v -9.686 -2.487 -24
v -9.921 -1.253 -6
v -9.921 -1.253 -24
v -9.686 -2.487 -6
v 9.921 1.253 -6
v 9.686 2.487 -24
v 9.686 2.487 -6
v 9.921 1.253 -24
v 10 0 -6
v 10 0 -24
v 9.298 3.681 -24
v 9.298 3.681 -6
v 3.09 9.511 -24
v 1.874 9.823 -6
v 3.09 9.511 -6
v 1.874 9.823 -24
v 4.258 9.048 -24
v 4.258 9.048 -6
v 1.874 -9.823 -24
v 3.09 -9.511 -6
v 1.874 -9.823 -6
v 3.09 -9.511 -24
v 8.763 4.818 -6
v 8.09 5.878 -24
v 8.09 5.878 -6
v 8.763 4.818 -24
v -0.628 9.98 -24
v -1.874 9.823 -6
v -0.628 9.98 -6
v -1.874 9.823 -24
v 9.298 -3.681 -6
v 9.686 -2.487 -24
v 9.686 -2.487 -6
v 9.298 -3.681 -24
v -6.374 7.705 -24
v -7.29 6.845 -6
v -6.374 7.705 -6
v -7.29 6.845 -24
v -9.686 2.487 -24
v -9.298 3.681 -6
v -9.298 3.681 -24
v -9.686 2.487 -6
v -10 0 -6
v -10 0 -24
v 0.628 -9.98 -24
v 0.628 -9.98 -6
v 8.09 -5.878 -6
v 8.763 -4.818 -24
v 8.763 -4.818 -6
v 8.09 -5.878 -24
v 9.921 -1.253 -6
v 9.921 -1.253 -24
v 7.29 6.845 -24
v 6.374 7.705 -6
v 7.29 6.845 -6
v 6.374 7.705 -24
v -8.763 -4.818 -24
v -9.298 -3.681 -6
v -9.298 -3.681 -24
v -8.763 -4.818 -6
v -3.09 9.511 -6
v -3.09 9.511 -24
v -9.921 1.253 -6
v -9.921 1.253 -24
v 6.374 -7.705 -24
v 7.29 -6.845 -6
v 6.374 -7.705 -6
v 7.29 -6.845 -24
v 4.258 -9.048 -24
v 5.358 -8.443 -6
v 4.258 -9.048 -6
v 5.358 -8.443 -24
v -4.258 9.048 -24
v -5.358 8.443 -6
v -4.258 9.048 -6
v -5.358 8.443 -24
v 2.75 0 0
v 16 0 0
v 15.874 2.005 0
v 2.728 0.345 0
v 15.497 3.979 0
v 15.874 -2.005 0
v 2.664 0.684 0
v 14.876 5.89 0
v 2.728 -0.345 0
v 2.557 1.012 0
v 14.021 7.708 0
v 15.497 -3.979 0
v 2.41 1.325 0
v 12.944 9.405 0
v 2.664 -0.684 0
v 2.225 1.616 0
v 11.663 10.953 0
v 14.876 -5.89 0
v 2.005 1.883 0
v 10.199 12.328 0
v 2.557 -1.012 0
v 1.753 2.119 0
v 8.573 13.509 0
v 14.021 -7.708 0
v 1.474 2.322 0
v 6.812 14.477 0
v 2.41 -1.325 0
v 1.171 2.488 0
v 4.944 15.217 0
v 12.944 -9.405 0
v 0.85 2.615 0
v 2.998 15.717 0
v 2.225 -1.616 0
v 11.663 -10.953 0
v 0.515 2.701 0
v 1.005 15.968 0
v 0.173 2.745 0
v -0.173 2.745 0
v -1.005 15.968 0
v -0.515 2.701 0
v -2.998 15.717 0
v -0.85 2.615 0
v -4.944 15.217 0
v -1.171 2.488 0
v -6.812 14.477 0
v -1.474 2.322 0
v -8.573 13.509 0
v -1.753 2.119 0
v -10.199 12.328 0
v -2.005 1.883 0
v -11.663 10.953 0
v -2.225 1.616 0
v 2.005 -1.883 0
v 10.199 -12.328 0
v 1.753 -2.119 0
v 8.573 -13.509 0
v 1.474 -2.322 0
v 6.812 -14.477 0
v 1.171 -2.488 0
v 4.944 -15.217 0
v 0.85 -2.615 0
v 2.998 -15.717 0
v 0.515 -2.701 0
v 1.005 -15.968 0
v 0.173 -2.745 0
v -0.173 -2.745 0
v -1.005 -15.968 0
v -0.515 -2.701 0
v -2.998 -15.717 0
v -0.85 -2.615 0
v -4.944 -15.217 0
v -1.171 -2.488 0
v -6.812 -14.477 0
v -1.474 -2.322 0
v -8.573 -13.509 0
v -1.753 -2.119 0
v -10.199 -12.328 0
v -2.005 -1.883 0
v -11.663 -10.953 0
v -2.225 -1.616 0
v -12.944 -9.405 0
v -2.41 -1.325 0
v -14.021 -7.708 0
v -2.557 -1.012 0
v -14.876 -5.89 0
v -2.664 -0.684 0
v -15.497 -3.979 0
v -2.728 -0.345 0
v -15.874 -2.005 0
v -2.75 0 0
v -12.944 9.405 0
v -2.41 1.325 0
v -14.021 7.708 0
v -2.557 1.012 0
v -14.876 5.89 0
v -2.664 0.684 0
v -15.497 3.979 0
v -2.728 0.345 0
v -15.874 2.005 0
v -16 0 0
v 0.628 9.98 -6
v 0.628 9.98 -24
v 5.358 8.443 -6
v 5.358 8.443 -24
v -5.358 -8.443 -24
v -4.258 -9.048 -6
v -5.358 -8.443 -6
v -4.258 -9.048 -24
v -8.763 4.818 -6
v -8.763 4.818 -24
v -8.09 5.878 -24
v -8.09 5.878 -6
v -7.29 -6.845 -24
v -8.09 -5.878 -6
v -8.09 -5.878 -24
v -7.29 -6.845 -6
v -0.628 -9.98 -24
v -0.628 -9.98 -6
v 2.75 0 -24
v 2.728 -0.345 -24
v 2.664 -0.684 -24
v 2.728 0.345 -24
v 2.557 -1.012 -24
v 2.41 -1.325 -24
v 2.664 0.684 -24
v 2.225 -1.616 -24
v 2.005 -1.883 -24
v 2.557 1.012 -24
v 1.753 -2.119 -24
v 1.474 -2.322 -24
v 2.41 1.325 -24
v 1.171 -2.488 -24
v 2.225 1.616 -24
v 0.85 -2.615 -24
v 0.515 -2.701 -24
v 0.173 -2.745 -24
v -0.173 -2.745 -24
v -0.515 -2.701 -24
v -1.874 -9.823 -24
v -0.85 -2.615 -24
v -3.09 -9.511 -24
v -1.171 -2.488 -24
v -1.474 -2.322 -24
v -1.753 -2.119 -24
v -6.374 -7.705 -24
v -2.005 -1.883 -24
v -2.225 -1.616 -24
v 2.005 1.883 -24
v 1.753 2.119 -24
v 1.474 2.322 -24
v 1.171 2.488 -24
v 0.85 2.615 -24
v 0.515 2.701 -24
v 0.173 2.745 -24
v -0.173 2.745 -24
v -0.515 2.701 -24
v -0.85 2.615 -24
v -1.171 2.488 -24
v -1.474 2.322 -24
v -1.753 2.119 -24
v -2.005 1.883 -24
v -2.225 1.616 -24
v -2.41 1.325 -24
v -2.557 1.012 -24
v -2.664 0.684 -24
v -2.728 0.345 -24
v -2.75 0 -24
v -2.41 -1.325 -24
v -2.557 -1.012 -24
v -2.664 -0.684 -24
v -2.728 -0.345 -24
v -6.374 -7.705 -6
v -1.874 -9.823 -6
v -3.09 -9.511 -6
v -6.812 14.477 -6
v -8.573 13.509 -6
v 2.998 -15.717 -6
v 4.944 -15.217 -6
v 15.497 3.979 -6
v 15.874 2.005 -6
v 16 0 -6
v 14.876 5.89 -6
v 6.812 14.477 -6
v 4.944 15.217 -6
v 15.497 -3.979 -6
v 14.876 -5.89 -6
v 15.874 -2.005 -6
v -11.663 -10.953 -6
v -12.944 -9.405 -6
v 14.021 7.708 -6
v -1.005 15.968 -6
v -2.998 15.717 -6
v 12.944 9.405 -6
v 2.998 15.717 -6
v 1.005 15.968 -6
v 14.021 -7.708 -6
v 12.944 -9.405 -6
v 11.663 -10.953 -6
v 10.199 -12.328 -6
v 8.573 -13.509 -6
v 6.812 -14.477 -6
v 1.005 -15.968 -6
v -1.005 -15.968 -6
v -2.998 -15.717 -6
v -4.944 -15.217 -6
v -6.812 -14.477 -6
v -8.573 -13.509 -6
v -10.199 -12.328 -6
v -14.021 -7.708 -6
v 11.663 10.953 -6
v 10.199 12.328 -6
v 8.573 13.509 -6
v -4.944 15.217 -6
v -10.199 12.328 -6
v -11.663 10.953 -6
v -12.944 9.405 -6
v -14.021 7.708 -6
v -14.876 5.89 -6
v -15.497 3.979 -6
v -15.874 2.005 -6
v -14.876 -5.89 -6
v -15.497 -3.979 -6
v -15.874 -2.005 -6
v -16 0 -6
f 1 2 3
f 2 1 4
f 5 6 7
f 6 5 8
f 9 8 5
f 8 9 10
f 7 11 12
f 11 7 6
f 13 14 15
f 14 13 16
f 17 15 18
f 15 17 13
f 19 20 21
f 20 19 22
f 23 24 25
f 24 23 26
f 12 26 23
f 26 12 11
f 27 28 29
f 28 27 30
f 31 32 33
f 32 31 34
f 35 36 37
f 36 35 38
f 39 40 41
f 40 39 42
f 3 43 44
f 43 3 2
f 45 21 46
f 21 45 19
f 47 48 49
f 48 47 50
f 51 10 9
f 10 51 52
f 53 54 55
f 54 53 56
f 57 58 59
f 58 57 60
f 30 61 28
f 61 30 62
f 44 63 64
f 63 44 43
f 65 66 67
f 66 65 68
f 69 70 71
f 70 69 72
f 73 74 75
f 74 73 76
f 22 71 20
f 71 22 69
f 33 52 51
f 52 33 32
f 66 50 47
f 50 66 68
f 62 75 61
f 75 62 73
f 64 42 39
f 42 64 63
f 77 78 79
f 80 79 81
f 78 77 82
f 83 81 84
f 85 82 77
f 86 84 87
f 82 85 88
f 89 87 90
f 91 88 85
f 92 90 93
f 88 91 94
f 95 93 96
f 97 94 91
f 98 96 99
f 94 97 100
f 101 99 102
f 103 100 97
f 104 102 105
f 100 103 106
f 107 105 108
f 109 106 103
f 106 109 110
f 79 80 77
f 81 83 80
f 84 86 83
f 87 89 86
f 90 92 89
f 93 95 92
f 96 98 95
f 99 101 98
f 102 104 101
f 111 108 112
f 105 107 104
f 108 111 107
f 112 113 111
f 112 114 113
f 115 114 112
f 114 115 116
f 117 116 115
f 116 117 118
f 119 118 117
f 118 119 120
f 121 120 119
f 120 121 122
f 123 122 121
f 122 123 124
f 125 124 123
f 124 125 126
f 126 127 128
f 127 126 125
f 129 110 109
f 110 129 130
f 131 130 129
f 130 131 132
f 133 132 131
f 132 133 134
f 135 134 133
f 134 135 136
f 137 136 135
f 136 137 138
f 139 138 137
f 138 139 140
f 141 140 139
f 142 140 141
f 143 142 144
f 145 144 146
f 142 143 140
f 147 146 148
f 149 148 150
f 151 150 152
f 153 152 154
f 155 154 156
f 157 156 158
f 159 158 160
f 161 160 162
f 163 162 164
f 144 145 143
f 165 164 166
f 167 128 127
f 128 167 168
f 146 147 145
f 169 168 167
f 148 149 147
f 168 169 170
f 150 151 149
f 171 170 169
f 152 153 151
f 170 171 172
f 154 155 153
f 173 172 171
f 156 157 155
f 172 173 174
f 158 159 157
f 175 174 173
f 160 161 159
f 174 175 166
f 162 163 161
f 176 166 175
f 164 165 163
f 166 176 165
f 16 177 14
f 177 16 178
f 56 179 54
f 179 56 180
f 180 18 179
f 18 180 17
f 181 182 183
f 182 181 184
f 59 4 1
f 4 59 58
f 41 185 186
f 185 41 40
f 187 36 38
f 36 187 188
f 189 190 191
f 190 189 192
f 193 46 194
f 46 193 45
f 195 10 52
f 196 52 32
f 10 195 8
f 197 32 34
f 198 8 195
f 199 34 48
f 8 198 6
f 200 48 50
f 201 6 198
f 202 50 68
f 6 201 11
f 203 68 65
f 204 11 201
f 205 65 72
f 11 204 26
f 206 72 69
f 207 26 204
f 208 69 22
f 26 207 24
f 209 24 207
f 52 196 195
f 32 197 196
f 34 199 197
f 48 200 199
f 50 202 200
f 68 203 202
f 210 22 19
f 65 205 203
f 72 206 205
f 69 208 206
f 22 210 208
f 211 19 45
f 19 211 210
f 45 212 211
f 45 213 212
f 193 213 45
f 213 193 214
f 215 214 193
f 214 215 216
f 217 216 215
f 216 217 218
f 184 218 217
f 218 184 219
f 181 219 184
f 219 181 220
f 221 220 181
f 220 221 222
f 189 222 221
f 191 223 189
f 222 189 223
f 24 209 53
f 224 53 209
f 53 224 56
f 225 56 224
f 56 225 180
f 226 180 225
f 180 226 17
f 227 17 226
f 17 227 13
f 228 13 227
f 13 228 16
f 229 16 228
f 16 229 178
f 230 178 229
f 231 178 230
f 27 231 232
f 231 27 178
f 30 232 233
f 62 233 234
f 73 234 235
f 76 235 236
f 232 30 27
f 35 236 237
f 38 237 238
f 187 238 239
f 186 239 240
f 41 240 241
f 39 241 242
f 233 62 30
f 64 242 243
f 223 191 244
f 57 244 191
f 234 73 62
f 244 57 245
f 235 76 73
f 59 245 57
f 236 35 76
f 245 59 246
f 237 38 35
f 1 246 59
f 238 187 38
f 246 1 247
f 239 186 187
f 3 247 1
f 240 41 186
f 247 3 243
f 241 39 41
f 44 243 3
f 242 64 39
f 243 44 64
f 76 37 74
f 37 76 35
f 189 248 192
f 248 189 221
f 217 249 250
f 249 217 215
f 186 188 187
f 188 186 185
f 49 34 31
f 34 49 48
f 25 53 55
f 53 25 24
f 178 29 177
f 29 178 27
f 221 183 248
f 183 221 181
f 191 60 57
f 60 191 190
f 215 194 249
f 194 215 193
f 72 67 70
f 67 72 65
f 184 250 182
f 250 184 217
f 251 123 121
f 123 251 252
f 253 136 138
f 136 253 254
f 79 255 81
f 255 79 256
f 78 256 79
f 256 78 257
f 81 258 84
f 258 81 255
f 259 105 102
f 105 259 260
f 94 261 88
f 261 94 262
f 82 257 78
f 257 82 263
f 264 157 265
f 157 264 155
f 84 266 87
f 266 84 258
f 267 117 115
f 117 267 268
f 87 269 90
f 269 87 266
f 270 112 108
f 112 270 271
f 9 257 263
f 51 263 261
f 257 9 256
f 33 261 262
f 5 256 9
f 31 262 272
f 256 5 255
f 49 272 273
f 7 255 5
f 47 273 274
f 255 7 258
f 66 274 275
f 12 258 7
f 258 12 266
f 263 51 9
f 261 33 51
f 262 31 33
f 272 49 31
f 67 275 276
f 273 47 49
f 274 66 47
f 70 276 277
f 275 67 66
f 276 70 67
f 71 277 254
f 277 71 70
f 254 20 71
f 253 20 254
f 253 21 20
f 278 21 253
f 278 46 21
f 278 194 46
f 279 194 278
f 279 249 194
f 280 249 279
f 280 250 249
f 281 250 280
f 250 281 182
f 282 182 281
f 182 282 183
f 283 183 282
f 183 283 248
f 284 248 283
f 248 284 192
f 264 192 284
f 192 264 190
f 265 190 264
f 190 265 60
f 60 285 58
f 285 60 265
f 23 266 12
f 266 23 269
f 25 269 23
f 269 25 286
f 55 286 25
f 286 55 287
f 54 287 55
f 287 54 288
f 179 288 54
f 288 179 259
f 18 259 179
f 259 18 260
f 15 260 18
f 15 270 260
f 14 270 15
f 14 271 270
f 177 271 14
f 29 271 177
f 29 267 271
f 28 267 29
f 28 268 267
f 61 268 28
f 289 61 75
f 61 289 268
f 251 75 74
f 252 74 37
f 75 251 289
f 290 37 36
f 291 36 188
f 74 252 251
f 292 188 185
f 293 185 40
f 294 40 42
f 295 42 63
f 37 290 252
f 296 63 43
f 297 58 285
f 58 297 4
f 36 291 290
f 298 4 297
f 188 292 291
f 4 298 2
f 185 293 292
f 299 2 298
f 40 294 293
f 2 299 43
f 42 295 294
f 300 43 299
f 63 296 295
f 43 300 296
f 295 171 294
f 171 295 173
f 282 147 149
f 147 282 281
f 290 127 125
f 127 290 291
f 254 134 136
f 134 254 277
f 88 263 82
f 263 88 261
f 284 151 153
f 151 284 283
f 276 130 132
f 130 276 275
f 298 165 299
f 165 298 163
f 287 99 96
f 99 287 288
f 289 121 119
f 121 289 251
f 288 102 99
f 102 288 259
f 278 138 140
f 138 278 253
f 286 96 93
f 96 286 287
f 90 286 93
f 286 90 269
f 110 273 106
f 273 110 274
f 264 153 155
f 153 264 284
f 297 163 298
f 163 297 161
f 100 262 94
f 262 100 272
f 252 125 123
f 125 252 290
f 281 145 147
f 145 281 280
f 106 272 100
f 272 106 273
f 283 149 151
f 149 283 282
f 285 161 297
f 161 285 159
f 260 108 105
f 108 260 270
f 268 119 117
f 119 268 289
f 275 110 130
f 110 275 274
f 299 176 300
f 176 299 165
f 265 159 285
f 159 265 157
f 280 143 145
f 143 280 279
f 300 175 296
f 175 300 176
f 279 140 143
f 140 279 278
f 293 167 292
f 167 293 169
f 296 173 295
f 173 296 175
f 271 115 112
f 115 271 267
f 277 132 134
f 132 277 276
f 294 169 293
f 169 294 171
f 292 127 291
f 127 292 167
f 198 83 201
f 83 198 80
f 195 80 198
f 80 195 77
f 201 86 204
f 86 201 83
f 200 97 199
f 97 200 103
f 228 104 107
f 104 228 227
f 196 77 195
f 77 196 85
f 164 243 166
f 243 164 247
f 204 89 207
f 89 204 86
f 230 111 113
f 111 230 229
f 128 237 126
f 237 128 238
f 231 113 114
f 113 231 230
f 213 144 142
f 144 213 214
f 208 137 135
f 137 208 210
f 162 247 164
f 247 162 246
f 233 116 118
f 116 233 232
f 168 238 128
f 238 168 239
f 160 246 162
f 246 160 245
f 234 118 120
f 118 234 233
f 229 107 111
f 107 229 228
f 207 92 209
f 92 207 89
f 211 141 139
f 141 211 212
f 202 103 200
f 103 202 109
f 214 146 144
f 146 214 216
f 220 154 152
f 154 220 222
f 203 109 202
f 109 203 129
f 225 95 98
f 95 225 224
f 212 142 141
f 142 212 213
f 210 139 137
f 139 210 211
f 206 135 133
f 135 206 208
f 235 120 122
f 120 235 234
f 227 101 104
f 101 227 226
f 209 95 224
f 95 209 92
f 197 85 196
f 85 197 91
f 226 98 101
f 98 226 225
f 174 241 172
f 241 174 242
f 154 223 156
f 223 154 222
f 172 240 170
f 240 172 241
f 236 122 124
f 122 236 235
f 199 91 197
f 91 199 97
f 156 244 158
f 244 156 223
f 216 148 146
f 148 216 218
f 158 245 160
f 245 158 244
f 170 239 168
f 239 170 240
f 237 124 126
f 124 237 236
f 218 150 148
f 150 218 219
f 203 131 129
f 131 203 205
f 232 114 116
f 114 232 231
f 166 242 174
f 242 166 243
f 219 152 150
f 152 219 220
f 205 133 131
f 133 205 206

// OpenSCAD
$fn = 50;


difference() {
	union() {
		translate(v = [0, 0, -24.0000000000]) {
			cylinder(h = 24, r = 10.0000000000);
		}
		translate(v = [0, 0, -6.0000000000]) {
			cylinder(h = 6, r = 16.0000000000);
		}
	}
	union() {
		#translate(v = [0, 0, -24]) {
			cylinder(h = 24, r = 2.7500000000);
		}
	}
}
